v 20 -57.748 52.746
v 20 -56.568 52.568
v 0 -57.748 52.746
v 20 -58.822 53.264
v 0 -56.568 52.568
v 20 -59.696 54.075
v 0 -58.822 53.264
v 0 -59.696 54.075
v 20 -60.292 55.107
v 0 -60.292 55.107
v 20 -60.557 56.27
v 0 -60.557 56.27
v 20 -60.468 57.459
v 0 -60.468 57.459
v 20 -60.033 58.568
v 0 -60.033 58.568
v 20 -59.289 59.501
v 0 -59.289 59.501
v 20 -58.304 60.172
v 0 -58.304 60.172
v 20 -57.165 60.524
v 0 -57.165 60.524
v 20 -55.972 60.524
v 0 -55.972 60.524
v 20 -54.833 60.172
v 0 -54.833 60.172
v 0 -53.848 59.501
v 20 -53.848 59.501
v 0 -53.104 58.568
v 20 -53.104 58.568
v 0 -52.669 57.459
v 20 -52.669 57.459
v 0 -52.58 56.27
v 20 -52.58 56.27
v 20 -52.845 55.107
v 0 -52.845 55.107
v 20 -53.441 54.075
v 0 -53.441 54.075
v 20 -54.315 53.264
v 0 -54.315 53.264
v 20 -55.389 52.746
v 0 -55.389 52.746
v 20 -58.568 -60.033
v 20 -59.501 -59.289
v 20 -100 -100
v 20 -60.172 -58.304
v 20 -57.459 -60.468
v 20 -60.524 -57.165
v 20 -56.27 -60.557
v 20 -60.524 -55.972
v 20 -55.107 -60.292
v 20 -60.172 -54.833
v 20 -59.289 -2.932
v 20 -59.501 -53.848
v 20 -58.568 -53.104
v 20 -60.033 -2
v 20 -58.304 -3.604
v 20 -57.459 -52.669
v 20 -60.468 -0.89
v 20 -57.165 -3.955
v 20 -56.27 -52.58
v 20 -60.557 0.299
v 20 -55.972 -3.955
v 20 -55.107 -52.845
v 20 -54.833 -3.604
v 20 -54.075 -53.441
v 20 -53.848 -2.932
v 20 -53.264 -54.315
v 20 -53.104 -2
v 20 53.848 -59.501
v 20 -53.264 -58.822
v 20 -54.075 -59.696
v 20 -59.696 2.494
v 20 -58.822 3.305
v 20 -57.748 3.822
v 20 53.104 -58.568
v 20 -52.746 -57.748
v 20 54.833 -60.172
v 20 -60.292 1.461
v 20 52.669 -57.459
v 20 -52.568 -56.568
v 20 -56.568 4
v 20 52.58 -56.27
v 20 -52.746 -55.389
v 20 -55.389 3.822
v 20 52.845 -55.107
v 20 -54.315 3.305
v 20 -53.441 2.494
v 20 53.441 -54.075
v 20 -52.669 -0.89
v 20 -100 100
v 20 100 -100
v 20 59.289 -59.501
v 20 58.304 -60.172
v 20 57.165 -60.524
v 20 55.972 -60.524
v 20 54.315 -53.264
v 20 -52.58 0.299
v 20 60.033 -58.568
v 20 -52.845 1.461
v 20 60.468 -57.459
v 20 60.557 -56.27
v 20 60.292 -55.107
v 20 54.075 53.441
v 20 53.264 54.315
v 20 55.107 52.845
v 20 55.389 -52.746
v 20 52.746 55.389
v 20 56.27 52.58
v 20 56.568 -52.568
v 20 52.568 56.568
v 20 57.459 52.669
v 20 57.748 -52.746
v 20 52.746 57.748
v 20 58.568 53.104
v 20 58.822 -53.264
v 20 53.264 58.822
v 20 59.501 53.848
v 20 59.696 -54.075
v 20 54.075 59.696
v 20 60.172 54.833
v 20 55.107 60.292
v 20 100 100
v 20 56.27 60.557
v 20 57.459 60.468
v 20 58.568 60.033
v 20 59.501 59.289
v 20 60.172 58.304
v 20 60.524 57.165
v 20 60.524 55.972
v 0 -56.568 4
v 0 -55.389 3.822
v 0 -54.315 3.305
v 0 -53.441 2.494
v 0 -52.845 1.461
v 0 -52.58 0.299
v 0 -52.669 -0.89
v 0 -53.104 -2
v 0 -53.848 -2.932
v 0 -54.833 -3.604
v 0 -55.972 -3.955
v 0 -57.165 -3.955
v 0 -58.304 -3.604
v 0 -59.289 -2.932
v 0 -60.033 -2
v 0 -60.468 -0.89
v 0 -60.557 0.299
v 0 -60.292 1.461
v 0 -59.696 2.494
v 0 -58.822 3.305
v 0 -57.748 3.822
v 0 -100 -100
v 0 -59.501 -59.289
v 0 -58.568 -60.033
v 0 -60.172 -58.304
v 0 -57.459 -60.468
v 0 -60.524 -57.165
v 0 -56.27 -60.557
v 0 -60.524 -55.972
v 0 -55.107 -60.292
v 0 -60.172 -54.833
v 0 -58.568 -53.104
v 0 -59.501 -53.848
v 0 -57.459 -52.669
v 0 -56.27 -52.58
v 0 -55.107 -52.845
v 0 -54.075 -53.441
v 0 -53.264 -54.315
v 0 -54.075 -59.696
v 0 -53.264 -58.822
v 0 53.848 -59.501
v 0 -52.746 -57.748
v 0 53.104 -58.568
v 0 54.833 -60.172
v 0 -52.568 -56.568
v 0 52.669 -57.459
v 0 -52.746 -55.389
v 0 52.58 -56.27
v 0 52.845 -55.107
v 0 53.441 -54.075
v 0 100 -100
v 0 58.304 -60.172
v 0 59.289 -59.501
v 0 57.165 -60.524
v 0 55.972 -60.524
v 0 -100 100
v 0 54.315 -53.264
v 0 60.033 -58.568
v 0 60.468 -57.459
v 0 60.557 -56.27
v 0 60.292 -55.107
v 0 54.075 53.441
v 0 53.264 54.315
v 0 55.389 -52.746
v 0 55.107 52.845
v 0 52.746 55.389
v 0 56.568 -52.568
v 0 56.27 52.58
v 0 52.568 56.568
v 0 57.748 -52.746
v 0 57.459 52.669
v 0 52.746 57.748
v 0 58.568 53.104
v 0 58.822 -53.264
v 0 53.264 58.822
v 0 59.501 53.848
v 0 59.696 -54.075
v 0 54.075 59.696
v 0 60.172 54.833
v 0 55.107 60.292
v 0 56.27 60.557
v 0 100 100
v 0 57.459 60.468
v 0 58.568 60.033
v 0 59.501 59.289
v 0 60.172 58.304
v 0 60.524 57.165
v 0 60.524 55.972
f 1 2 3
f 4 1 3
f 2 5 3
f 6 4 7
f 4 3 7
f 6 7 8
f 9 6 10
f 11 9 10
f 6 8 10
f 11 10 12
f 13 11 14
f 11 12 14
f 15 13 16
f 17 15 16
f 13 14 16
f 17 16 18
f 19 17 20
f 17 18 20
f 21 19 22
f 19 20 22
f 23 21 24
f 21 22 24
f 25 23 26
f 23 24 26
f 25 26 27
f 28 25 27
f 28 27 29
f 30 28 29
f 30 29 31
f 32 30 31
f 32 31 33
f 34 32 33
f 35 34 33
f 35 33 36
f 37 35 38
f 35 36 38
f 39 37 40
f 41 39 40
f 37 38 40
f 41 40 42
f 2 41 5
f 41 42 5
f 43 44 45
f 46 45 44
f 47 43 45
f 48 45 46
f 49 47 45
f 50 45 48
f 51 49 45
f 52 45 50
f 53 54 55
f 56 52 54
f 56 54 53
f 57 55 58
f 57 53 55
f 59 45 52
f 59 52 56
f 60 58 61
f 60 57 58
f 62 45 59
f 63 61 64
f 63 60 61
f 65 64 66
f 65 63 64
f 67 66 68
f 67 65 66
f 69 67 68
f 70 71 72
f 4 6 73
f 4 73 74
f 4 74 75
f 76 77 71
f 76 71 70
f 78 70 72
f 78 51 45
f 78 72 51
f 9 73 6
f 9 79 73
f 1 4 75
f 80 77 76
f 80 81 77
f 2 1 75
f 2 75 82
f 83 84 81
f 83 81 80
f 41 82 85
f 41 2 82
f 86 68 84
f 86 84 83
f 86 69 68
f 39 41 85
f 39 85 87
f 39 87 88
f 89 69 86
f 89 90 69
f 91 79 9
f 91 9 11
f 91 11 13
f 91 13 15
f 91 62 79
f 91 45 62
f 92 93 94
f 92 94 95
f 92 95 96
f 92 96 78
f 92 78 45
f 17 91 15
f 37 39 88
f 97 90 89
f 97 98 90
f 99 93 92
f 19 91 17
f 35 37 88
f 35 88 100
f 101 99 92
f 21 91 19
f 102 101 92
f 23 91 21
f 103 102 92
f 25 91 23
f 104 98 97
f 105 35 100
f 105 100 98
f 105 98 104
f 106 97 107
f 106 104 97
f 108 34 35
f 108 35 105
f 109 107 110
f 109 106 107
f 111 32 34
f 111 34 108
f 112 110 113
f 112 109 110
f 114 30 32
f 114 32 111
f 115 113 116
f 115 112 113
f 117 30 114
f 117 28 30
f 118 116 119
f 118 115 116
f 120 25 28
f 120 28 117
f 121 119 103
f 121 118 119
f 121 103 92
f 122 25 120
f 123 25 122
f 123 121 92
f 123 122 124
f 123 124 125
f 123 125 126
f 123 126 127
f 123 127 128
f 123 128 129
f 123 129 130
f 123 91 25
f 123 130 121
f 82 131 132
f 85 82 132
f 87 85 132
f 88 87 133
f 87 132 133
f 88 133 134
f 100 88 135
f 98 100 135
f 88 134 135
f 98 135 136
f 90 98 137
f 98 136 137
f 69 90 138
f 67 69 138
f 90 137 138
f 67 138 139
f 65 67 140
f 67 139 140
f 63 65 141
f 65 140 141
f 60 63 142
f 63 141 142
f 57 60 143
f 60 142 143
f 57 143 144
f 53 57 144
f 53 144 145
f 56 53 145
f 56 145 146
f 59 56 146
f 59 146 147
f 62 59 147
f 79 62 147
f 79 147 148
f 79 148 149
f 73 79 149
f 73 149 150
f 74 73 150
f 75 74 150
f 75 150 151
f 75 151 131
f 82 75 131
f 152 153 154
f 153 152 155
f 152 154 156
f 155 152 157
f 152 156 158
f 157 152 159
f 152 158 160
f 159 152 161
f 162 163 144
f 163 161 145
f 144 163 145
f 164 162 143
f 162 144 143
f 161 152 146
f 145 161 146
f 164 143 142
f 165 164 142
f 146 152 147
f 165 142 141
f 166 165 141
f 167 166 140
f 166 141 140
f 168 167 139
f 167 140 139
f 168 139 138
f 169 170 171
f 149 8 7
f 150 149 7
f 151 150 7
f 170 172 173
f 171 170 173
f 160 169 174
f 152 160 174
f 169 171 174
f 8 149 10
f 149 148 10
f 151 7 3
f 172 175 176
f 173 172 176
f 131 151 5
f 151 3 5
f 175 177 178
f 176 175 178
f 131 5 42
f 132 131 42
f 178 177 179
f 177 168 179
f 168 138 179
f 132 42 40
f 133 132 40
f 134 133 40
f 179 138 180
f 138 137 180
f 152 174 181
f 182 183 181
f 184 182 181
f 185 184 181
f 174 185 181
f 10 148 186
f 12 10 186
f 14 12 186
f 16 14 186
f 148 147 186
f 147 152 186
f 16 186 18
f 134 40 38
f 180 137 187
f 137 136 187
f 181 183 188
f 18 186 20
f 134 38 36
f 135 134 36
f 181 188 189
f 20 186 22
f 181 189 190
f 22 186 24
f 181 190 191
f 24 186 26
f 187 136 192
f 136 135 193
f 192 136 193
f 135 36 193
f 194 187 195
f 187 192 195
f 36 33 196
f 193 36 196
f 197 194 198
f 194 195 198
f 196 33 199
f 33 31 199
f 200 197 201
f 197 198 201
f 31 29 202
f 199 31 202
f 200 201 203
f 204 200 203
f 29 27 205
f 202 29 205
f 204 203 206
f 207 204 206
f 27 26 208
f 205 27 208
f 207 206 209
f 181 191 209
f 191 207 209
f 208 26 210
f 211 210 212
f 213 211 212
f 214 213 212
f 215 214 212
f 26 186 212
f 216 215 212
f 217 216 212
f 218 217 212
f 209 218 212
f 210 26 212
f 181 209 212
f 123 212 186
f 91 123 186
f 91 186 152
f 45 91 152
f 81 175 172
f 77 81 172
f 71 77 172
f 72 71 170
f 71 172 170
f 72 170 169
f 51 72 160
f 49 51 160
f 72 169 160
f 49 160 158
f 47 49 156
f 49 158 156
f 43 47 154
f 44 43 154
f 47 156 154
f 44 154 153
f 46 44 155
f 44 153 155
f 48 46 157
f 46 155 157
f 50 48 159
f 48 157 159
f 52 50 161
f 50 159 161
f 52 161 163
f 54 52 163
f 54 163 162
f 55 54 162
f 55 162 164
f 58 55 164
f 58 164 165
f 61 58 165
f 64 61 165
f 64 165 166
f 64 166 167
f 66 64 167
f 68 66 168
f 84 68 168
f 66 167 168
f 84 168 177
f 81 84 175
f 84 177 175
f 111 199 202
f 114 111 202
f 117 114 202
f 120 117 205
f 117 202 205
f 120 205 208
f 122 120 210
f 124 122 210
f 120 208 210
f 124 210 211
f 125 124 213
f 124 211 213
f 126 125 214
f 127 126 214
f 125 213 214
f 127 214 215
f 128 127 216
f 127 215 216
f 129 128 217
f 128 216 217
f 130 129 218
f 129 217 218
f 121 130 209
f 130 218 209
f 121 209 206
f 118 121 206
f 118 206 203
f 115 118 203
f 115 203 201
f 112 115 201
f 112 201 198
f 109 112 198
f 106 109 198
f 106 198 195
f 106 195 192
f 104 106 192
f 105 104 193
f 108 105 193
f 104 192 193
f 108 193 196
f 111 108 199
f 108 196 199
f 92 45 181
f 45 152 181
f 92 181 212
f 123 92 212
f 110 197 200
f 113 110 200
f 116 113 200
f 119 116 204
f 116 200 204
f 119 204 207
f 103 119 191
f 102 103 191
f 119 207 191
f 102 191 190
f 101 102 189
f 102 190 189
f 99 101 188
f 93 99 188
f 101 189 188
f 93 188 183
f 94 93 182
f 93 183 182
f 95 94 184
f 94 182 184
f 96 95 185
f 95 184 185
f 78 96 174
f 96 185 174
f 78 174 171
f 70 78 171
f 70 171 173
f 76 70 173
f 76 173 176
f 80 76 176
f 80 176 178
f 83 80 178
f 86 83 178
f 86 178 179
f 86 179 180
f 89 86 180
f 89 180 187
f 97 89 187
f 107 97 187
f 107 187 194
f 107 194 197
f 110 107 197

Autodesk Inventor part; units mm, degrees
ref_plane "YZ Plane" through (0, 0, 0) normal (1, 0, 0) x (0, 1, 0)
ref_plane "XZ Plane" through (0, 0, 0) normal (0, 1, 0) x (-1, 0, 0)
ref_plane "XY Plane" through (0, 0, 0) normal (0, 0, 1) x (1, 0, 0)
sketch "Sketch1" plane through (0, 0, 0) normal (1, 0, 0) x (0, 1, 0)
  line L0 (0, 100) -> (-100, 100)
  line L1 (-100, 100) -> (-100, -100)
  line L2 (-100, -100) -> (100, -100)
  line L3 (100, -100) -> (100, 100)
  line L4 (100, 100) -> (0, 100)
  point P0 (0, 0)
  dimension "d1" = 100
  dimension "d2" = 200
  dimension "d3" = 200
  dimension "d4" = 200
extrude "Extrusion1" add sketch "Sketch1" along normal blind 20
sketch "Sketch2" plane through (0, 0, 0) normal (-1, 0, 0) x (0, 0, 1)
  circle A0 centre (-56.5685, 56.5685) radius 4
  point P0 (0, 0)
  dimension "d11" = 8
extrude "Extrusion2" cut sketch "Sketch2" against normal blind 20
pattern_circular "Circular Pattern1" count 4 over 360 about axis through (-10, 0, 0) along (1, 0, 0) of "Extrusion2"
sketch "Sketch3" plane through (0, 0, 0) normal (-1, 0, 0) x (0, 0, 1)
  circle A0 centre (-56.5685, -56.5685) radius 4 projected
  circle A1 centre (56.5685, -56.5685) radius 4 projected
  circle A2 centre (0, -56.5685) radius 4
  point P0 (0, 0)
  dimension "d17" = 8
extrude "Extrusion3" cut sketch "Sketch3" against normal blind 20 contours A2
properties part number "TMP_fix_plate"
